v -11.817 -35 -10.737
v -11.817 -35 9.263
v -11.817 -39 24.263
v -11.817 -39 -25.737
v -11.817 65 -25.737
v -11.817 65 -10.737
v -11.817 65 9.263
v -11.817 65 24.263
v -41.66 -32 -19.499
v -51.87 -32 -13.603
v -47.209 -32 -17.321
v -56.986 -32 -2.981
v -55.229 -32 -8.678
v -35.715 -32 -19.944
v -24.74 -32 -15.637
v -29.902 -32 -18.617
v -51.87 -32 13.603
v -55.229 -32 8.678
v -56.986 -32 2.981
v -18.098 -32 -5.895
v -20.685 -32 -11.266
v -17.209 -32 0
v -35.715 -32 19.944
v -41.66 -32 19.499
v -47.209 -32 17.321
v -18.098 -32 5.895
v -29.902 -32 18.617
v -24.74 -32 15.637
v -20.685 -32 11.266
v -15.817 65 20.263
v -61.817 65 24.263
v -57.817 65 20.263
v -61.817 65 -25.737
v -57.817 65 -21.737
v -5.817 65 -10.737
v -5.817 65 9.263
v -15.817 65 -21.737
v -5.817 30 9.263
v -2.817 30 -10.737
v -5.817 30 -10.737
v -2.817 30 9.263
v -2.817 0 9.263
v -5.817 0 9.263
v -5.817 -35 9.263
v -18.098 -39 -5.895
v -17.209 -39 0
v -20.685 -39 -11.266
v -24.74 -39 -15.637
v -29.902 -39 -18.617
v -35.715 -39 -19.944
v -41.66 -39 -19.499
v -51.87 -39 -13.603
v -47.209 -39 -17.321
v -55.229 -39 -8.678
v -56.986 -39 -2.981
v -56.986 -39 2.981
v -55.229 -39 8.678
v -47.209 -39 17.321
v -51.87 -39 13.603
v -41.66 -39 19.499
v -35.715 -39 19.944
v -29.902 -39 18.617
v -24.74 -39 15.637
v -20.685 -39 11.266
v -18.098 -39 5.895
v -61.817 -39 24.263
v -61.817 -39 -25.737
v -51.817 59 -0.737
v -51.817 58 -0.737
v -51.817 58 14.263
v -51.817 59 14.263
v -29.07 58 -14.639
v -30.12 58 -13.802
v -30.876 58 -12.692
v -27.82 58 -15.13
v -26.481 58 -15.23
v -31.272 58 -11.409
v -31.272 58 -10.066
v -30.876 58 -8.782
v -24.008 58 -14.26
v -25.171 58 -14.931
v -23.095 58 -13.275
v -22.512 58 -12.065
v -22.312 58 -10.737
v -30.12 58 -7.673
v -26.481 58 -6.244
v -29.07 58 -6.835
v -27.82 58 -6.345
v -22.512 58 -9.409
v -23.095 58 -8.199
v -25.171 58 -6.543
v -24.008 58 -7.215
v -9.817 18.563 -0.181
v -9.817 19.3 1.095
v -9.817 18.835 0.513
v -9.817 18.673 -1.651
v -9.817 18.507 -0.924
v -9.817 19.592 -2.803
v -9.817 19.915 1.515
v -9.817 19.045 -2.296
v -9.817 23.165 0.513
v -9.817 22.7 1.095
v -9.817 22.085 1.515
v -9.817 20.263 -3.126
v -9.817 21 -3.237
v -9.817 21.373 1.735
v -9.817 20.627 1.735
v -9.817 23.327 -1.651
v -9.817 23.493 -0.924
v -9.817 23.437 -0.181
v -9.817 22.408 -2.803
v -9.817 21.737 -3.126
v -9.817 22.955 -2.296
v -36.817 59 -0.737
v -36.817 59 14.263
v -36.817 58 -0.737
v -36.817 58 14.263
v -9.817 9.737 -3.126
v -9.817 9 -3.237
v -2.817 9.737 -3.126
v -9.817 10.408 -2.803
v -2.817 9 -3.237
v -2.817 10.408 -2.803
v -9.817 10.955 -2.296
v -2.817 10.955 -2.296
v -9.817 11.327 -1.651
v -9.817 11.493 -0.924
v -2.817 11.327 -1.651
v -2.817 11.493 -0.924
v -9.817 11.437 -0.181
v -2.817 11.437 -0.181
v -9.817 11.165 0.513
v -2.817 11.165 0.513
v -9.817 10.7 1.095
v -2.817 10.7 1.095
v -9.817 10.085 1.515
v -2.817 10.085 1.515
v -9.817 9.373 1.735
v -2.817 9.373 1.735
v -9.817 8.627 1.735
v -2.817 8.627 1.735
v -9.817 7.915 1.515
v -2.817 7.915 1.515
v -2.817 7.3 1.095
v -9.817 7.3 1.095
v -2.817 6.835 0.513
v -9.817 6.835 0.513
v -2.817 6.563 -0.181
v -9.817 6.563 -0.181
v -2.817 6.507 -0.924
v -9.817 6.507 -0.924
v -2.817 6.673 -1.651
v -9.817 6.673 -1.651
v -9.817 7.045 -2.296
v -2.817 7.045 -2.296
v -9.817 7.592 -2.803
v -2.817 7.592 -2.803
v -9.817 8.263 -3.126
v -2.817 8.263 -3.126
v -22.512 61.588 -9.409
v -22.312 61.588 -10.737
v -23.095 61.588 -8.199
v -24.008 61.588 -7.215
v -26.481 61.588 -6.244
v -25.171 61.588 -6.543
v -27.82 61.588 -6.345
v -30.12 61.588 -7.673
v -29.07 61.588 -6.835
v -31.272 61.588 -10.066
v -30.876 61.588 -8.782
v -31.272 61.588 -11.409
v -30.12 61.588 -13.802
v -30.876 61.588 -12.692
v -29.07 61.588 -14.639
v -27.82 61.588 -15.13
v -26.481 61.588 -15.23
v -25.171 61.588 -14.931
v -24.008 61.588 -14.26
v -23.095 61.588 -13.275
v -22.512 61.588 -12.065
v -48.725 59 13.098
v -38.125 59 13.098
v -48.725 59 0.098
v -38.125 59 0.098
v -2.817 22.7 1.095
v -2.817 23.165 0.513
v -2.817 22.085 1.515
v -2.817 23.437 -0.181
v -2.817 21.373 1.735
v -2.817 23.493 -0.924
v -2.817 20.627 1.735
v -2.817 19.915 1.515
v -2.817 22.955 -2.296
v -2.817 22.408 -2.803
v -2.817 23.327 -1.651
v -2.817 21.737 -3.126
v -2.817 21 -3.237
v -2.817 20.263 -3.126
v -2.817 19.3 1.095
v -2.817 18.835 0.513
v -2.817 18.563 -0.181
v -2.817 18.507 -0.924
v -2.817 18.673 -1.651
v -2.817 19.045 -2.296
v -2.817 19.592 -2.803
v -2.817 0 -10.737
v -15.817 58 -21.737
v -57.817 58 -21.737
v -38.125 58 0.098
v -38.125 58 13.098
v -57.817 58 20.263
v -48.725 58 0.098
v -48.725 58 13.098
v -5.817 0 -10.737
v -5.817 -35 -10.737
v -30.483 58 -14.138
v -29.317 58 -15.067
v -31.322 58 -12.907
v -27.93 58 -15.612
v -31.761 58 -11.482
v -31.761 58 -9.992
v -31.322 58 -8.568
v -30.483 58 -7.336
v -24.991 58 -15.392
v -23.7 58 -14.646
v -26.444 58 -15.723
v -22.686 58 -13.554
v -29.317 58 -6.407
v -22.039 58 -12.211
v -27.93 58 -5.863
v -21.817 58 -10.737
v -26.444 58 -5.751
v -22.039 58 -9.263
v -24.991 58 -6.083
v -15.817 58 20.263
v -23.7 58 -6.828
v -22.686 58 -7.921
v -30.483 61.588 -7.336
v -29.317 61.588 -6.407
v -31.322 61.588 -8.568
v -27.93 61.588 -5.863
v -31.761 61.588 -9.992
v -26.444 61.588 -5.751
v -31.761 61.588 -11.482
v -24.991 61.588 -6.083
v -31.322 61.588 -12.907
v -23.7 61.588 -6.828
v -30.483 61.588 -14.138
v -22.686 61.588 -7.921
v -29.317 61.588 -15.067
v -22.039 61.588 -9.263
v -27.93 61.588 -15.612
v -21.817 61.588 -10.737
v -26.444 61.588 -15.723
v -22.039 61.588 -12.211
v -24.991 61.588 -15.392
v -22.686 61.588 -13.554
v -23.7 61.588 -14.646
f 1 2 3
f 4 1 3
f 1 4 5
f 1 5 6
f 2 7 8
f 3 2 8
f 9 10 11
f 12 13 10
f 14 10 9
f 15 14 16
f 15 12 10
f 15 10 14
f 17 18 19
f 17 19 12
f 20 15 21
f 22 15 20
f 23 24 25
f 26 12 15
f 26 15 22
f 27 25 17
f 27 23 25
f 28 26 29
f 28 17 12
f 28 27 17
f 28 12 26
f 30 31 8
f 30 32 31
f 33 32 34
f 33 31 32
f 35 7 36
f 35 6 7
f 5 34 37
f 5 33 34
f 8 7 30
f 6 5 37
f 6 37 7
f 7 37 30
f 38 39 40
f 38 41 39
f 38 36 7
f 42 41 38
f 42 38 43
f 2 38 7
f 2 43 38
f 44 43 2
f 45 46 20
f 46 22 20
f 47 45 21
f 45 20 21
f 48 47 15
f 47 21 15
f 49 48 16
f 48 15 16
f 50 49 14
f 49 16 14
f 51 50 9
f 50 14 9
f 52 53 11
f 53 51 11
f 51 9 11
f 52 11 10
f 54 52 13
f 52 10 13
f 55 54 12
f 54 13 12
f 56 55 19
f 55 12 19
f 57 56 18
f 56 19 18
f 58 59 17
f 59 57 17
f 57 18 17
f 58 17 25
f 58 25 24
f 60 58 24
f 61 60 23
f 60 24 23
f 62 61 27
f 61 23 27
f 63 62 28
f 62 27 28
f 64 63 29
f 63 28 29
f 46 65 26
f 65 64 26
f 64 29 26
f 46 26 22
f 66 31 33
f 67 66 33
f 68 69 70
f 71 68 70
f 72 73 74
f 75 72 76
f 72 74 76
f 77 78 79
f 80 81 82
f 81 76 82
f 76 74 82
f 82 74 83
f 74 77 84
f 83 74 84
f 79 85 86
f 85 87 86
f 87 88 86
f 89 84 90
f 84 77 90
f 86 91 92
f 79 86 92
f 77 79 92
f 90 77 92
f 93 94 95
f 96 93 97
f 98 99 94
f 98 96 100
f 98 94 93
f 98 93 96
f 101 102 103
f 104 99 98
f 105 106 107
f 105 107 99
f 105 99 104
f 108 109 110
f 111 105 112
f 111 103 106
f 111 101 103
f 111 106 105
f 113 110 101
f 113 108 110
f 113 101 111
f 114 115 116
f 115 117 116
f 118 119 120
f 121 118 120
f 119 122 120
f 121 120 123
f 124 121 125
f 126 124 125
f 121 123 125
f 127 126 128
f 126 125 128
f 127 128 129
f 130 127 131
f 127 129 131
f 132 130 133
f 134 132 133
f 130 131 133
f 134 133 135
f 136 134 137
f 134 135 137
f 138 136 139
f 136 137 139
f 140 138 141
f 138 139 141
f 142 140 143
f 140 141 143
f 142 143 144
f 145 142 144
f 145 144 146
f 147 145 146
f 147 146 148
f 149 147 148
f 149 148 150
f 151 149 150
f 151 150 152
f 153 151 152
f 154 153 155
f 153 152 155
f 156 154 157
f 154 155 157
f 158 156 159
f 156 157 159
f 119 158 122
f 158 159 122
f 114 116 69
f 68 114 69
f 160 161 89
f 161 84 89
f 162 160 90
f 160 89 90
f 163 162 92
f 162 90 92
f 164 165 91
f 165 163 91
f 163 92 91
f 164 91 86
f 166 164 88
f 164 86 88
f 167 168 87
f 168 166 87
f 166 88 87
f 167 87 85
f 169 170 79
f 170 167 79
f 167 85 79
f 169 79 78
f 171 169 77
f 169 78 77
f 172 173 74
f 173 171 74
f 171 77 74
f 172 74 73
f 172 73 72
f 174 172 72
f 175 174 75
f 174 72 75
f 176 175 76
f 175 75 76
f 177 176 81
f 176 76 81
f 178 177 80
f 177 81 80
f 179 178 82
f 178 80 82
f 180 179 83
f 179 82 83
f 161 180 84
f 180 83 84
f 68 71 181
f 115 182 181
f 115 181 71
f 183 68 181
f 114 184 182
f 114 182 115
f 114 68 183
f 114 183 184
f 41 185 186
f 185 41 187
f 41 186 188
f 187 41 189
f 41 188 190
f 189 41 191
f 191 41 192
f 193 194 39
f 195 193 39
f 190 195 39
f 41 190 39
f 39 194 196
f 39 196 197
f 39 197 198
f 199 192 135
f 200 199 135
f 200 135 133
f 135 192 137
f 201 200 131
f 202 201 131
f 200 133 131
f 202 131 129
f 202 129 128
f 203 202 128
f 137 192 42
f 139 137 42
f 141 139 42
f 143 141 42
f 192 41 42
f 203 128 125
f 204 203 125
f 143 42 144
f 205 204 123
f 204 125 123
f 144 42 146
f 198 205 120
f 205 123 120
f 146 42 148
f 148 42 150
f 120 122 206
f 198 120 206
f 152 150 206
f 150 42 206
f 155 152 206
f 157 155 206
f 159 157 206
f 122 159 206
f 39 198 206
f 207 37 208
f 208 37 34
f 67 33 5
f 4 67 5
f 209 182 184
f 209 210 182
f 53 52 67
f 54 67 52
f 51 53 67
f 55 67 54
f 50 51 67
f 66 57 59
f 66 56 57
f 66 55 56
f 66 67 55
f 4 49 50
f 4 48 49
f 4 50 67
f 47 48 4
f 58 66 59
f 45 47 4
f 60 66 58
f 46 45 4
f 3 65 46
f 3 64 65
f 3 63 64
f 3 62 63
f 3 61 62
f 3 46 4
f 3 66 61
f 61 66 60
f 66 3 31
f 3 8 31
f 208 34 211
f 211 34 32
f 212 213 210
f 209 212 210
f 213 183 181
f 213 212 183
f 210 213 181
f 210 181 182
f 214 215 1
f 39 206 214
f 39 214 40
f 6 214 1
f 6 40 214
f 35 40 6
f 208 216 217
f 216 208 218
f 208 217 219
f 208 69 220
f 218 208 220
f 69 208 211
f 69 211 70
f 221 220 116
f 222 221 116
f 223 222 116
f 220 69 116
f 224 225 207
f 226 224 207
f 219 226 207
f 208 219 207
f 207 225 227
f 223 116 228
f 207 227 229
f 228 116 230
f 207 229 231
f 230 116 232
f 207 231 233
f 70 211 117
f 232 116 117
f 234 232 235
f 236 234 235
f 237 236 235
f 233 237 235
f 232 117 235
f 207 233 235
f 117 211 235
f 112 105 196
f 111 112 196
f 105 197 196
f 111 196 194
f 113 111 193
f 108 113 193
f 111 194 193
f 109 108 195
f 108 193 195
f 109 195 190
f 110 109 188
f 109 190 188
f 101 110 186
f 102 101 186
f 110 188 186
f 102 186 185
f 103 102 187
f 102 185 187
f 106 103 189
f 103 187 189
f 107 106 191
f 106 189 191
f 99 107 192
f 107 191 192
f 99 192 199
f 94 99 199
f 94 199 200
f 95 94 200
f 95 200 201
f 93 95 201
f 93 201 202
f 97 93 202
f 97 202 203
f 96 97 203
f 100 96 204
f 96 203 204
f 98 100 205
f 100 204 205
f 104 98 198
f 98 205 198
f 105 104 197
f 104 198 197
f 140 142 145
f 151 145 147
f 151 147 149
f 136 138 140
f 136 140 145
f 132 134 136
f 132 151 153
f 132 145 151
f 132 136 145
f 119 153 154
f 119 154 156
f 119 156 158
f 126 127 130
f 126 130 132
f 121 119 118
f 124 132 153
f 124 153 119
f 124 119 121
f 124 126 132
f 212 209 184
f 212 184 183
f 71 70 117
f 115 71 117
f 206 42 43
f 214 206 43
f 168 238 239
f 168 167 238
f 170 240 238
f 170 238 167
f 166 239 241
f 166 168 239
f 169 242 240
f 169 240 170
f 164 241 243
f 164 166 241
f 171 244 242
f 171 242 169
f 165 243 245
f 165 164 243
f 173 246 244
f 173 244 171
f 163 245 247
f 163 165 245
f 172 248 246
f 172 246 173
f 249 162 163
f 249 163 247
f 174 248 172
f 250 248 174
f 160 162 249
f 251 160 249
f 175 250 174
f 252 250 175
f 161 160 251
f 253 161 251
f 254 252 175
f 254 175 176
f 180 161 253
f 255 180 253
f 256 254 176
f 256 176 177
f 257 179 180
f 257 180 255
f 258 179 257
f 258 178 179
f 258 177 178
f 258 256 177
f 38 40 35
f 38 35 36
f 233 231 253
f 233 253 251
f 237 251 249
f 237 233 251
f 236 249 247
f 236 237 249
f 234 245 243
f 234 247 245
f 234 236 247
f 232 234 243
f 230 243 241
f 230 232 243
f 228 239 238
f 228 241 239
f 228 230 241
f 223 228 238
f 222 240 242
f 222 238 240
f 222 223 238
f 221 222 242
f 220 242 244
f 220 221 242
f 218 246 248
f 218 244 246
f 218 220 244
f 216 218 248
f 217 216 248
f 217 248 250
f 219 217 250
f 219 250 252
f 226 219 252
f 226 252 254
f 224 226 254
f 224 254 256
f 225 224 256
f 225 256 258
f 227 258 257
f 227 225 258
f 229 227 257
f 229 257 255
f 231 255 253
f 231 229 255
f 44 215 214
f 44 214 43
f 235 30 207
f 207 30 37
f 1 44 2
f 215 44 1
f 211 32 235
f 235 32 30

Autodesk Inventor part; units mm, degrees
ref_plane "YZ Plane" through (0, 0, 0) normal (1, 0, 0) x (0, 1, 0)
ref_plane "XZ Plane" through (0, 0, 0) normal (0, 1, 0) x (-1, 0, 0)
ref_plane "XY Plane" through (0, 0, 0) normal (0, 0, 1) x (1, 0, 0)
sketch "Sketch1" plane through (0, 0, 0) normal (0, 1, 0) x (-1, 0, 0)
  line L0 (5.8173, 9.2628) -> (2.8173, 9.2628)
  line L1 (2.8173, 9.2628) -> (2.8173, -10.7372)
  line L2 (2.8173, -10.7372) -> (5.8173, -10.7372)
  line L3 (5.8173, -10.7372) -> (5.8173, 9.2628)
  point P0 (0, 0)
  dimension "d0" = 20
  dimension "d1" = 3
extrude "Extrusion1" add sketch "Sketch1" along normal blind 30
sketch "Sketch2" plane through (-2.8173, 0, 9.2628) normal (1, 0, 0) x (0, 0, -1)
  circle A0 centre (10, 21) radius 2.5
  circle A1 centre (10, 9) radius 2.5
  line L0 (0, 30) -> (20, 30) projected
  line L1 (0, 0) -> (20, 0) projected
  line L2 (10, 30) -> (10, 21) construction
  line L3 (10, 9) -> (10, 0) construction
  point P0 (9.2628, 0)
  dimension "d4" = 5
  dimension "d5" = 5
  dimension "d41" = 12
sketch "Sketch3" plane through (-5.8173, 0, -10.7372) normal (-1, 0, 0) x (0, 0, 1)
  line L0 (0, 65) -> (20, 65)
  line L1 (20, 65) -> (20, -35)
  line L2 (20, -35) -> (0, -35)
  line L3 (0, -35) -> (0, 65)
  line L4 (20, 0) -> (20, 30) projected
  line L5 (0, 0) -> (0, 30) projected
  line L6 (0, 30) -> (20, 30) projected
  line L7 (0, 0) -> (20, 0) projected
  point P0 (10.7372, 0)
  dimension "d9" = 35
  dimension "d10" = 35
extrude "Extrusion2" add sketch "Sketch3" along normal blind 6
sketch "Sketch4" plane through (-5.8173, 65, 9.2628) normal (0, 1, 0) x (1, 0, 0)
  line L0 (-56, 35) -> (-6, 35)
  line L1 (-6, 35) -> (-6, -15)
  line L2 (-6, -15) -> (-56, -15)
  line L3 (-56, -15) -> (-56, 35)
  line L4 (-6, 0) -> (-6, 20) projected
  line L5 (0, 20) -> (-6, 20) projected
  line L6 (-6, 10) -> (-56, 10) construction
  line L7 (-31, 35) -> (-31, 10) construction
  line L8 (-31, -15) -> (-31, 10) construction
  line L9 (-10, 31) -> (-52, 31)
  line L10 (-52, 31) -> (-52, -11)
  line L11 (-52, -11) -> (-10, -11)
  line L12 (-10, -11) -> (-10, 31)
  point P0 (5.8173, 9.2628)
  dimension "d13" = 50
  dimension "d14" = 50
  dimension "d16" = 4
extrude "Extrusion3" add sketch "Sketch4" against normal blind 7
sketch "Sketch5" plane through (-5.8173, 58, 9.2628) normal (0, -1, 0) x (1, 0, 0)
  line L0 (-56, 15) -> (-56, -35) projected
  line L1 (-56, -35) -> (-6, -35) projected
  line L2 (-6, -35) -> (-6, -20) projected
  line L3 (-6, 0) -> (-6, -20) projected
  line L4 (-6, 0) -> (-6, 15) projected
  line L5 (-6, 15) -> (-56, 15) projected
  line L6 (-10, 11) -> (-10, -31) projected
  line L7 (-10, -31) -> (-52, -31) projected
  line L8 (-52, -31) -> (-52, 11) projected
  line L9 (-52, 11) -> (-10, 11) projected
  point P0 (5.8173, -9.2628)
extrude "Extrusion4" add sketch "Sketch5" along normal blind 90 contours L5 L4 L3 L2 L1 L0 | L6 L7 L8 L9
sketch "Sketch6" plane through (-5.8173, -32, 9.2628) normal (0, -1, 0) x (1, 0, 0)
  line L0 (-10, 11) -> (-10, -31) projected
  line L1 (-52, 11) -> (-10, 11) projected
  line L2 (-52, -31) -> (-52, 11) projected
  line L3 (-10, -31) -> (-52, -31) projected
  line L4 (-6, 15) -> (-56, 15) projected
  line L5 (-56, 15) -> (-56, -35) projected
  line L6 (-56, -35) -> (-6, -35) projected
  line L7 (-6, -35) -> (-6, -20) projected
  line L8 (-6, 0) -> (-6, -20) projected
  line L9 (-6, 0) -> (-6, 15) projected
  point P0 (5.8173, -9.2628)
extrude "Extrusion5" add sketch "Sketch6" along normal blind 7
extrude "Extrusion6" cut sketch "Sketch2" against normal blind 7
sketch "Sketch7" plane through (-5.8173, -32, 9.2628) normal (0, -1, 0) x (1, 0, 0)
  circle A0 centre (-31.392, -9.2628) radius 20
  line L0 (-10, 11) -> (-52, 11) projected
  line L1 (-52, 11) -> (-52, -31) projected
  line L2 (-52, -31) -> (-10, -31) projected
  line L3 (-10, -31) -> (-10, 11) projected
  line L4 (-6, 15) -> (-56, 15) projected
  line L5 (-56, 15) -> (-56, -35) projected
  line L6 (-56, -35) -> (-6, -35) projected
  line L7 (-6, -35) -> (-6, 15) projected
  line L8 (-10, 11) -> (-10, -31) projected
  line L9 (-10, -31) -> (-52, -31) projected
  line L10 (-52, -31) -> (-52, 11) projected
  line L11 (-52, 11) -> (-10, 11) projected
  point P0 (5.8173, -9.2628)
  dimension "d25" = 40
extrude "Extrusion7" add sketch "Sketch7" along normal blind 7 contours L3 L2 L1 L0
sketch "Sketch8" plane through (-5.8173, 58, 9.2628) normal (0, 1, 0) x (1, 0, 0)
  circle A0 centre (-21, 20) radius 5
  line L0 (-46, -5) -> (-31, -5)
  line L1 (-31, -5) -> (-31, 10)
  line L2 (-31, 10) -> (-46, 10)
  line L3 (-46, 10) -> (-46, -5)
  line L4 (-6, 35) -> (-56, 35) projected
  line L5 (-6, 20) -> (-6, 35) projected
  line L6 (-56, -15) -> (-6, -15) projected
  line L7 (-56, 35) -> (-56, -15) projected
  circle A1 centre (-21, 20) radius 4.5053
  line L8 (-42.9073, -3.8349) -> (-32.3073, -3.8349)
  line L9 (-32.3073, -3.8349) -> (-32.3073, 9.1651)
  line L10 (-32.3073, 9.1651) -> (-42.9073, 9.1651)
  line L11 (-42.9073, 9.1651) -> (-42.9073, -3.8349)
  point P0 (5.8173, 9.2628)
  dimension "d28" = 15
  dimension "d29" = 15
  dimension "d30" = 10
  dimension "d31" = 15
  dimension "d32" = 15
  dimension "d33" = 10
  dimension "d34" = 10
  dimension "d35" = 10.6
  dimension "d36" = 13
extrude "Extrusion8" add sketch "Sketch8" along normal blind 1
sketch "Sketch10" plane through (-26.8173, 59, -10.7372) normal (0, 1, 0) x (1, 0, 0)
  circle A0 centre (0, 0) radius 4.5053 projected
  circle A1 centre (0, 0) radius 5 projected
  point P0 (26.8173, -10.7372)
extrude "Extrusion9" add sketch "Sketch10" along normal blind 2.5875
properties part number "camera" material "PAEK Plastic"
